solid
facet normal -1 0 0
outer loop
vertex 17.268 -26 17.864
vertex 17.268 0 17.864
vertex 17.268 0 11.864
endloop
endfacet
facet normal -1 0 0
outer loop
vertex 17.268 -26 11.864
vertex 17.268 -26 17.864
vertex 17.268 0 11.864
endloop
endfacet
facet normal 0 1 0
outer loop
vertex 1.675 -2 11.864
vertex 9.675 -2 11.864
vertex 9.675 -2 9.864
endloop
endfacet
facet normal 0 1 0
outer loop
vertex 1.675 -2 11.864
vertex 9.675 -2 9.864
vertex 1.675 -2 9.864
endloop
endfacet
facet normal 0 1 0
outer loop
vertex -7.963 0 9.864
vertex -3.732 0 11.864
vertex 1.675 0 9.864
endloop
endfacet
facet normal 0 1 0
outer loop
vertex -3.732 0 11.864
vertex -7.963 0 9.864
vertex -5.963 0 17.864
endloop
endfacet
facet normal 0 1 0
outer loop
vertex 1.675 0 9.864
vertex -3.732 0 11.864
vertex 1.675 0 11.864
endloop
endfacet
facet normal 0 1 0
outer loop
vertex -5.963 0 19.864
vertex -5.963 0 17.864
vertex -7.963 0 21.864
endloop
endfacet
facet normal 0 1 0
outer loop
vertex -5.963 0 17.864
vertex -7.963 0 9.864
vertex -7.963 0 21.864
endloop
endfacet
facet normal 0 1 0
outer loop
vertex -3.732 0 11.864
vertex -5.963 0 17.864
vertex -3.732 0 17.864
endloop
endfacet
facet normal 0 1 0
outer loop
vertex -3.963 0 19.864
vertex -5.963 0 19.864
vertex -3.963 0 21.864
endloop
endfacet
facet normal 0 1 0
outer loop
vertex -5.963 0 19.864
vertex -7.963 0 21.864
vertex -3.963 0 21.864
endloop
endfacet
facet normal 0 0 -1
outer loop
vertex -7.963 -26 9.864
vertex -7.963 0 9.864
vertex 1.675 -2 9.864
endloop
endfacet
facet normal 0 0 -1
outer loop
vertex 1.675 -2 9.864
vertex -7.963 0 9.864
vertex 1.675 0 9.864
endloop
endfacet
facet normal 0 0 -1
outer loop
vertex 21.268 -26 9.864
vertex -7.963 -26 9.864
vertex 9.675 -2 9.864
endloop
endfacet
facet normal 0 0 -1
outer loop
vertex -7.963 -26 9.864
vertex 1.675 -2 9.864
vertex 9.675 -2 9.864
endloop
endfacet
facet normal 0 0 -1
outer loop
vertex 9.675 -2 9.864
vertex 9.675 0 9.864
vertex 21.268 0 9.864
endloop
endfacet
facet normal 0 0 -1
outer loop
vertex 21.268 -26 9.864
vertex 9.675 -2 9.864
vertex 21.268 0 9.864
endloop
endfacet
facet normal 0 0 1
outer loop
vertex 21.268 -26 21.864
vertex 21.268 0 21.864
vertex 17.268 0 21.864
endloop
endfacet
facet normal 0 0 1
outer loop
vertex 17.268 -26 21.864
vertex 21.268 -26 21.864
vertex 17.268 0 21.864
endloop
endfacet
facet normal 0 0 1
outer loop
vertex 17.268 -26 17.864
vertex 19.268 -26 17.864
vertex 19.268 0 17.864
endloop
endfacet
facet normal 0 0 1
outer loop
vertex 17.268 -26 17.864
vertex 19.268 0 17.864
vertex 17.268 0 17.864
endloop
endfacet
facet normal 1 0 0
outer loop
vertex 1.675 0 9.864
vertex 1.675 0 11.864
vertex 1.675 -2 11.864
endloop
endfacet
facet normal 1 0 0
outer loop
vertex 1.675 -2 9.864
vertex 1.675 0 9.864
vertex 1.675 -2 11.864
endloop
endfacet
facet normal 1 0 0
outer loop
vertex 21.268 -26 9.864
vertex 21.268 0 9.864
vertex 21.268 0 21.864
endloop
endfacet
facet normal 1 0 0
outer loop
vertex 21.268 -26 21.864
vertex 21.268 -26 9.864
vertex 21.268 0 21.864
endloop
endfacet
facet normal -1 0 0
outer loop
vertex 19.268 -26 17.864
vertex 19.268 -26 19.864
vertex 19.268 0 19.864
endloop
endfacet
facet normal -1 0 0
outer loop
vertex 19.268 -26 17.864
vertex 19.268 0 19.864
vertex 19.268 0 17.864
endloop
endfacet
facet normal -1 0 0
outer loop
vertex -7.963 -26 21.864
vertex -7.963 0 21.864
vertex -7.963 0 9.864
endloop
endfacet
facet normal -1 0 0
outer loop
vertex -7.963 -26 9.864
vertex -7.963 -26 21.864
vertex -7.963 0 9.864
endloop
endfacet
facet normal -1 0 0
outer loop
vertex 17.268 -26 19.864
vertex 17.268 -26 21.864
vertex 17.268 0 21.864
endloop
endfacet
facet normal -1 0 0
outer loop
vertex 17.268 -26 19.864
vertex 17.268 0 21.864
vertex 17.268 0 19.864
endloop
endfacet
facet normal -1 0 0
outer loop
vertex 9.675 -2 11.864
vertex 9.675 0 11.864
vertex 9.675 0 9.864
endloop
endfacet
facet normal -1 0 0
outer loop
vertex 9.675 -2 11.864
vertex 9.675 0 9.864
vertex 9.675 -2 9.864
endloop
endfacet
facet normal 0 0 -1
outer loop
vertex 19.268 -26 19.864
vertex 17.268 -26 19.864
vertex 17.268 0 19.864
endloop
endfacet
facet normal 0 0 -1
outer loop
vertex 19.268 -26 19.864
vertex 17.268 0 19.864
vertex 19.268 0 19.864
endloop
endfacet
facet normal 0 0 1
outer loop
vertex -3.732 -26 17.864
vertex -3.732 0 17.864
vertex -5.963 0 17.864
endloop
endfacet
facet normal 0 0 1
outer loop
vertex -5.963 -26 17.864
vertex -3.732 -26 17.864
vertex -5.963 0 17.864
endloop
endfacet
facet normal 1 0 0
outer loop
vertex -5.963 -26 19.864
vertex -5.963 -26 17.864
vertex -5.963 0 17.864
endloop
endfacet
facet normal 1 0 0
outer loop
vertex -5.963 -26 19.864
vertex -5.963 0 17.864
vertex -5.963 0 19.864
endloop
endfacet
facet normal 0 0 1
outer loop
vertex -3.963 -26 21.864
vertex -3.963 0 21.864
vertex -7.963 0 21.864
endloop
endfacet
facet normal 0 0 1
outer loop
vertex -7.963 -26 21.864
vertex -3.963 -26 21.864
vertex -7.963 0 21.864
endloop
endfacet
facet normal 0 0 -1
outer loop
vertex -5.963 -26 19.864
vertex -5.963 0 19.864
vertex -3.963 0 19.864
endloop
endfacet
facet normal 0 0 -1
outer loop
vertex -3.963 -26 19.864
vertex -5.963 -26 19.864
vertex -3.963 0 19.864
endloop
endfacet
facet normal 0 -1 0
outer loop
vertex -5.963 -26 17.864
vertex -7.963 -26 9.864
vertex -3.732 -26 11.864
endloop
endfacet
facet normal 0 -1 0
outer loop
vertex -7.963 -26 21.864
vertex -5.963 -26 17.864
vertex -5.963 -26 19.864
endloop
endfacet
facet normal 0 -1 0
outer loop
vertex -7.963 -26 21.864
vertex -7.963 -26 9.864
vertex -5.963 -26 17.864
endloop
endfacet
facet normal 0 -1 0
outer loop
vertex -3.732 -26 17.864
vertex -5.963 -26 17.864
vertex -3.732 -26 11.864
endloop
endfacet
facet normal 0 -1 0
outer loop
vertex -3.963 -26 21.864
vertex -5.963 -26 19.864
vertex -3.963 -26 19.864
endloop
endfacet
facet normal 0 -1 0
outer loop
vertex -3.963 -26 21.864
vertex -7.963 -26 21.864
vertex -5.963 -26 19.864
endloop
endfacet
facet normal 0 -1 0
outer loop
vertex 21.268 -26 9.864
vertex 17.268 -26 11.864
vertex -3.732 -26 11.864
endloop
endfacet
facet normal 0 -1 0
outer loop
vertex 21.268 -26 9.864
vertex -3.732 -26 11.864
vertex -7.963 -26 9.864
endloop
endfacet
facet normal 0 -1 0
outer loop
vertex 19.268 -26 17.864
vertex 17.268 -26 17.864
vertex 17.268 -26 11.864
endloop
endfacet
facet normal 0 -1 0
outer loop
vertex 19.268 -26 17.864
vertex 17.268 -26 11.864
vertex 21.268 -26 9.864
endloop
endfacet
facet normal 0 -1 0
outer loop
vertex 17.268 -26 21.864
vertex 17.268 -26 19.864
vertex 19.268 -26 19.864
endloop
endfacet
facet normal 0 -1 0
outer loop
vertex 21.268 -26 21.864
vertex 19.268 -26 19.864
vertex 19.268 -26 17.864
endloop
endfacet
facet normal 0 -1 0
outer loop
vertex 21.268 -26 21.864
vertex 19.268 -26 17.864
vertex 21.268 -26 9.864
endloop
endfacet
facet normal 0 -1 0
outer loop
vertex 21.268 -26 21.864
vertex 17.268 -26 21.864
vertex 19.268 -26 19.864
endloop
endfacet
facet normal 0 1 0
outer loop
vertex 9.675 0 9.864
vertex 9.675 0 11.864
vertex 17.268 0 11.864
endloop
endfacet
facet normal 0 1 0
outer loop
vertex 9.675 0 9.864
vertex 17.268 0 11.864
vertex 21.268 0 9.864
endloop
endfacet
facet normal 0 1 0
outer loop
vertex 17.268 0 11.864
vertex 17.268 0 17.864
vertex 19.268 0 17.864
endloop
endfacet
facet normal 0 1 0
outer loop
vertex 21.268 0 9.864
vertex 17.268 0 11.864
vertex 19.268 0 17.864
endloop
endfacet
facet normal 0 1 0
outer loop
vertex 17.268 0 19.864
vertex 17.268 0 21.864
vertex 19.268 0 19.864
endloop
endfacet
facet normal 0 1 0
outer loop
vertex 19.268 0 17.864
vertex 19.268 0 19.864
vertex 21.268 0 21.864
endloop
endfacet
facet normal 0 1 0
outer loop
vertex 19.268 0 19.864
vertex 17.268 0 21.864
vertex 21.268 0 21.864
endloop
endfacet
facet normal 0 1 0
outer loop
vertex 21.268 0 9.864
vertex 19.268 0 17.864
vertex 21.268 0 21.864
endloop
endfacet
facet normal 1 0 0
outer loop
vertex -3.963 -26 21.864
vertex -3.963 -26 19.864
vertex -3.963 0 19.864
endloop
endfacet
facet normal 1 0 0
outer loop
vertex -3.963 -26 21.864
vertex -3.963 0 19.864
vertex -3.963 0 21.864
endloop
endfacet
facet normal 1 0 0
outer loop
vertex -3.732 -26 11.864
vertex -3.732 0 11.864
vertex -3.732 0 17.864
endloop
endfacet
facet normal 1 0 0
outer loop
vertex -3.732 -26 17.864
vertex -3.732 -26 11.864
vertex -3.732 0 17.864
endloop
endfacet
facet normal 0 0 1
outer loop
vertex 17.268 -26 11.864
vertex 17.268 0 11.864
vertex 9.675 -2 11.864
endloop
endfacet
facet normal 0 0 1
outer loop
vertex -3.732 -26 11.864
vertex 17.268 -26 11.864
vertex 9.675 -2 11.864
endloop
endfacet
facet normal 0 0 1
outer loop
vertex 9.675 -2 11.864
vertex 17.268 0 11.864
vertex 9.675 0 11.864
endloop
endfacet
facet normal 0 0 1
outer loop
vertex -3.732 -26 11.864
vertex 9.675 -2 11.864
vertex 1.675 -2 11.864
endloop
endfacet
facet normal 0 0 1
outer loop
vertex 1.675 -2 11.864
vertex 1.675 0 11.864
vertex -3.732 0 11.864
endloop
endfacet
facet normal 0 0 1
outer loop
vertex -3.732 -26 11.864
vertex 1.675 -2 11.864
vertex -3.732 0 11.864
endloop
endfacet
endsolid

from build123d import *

# Parameters (mm, degrees)
PAD_DEPTH    = 26
SKETCH001_W  = 8
SKETCH001_H  = 2
POCKET_DEPTH = 2.001


with BuildPart() as part:
    # Sketch → Pad (new body)
    with BuildSketch(Plane.XZ):
        Polygon((-3.96322, 19.863666), (-3.96322, 21.863666), (-7.96322, 21.863666), (-7.96322, 9.863666), (21.2675, 9.863666), (21.2675, 21.863666), (17.2675, 21.863666), (17.2675, 19.863666), (19.2675, 19.863666), (19.2675, 17.863666), (17.2675, 17.863666), (17.2675, 11.863666), (-3.7325, 11.863666), (-3.7325, 17.863666), (-5.96322, 17.863666), (-5.96322, 19.863666), align=None)
    extrude(amount=PAD_DEPTH)

    # Sketch001 (on Face12 of Pad) → Pocket (cut, through all)
    with BuildSketch(Plane(origin=(0, 0, 11.863666), x_dir=(-1, 0, 0), z_dir=(0, 0, 1))):
        with Locations((-5.674862, 1)):
            Rectangle(SKETCH001_W, SKETCH001_H)
    extrude(amount=-POCKET_DEPTH, mode=Mode.SUBTRACT)


solid = part.part
